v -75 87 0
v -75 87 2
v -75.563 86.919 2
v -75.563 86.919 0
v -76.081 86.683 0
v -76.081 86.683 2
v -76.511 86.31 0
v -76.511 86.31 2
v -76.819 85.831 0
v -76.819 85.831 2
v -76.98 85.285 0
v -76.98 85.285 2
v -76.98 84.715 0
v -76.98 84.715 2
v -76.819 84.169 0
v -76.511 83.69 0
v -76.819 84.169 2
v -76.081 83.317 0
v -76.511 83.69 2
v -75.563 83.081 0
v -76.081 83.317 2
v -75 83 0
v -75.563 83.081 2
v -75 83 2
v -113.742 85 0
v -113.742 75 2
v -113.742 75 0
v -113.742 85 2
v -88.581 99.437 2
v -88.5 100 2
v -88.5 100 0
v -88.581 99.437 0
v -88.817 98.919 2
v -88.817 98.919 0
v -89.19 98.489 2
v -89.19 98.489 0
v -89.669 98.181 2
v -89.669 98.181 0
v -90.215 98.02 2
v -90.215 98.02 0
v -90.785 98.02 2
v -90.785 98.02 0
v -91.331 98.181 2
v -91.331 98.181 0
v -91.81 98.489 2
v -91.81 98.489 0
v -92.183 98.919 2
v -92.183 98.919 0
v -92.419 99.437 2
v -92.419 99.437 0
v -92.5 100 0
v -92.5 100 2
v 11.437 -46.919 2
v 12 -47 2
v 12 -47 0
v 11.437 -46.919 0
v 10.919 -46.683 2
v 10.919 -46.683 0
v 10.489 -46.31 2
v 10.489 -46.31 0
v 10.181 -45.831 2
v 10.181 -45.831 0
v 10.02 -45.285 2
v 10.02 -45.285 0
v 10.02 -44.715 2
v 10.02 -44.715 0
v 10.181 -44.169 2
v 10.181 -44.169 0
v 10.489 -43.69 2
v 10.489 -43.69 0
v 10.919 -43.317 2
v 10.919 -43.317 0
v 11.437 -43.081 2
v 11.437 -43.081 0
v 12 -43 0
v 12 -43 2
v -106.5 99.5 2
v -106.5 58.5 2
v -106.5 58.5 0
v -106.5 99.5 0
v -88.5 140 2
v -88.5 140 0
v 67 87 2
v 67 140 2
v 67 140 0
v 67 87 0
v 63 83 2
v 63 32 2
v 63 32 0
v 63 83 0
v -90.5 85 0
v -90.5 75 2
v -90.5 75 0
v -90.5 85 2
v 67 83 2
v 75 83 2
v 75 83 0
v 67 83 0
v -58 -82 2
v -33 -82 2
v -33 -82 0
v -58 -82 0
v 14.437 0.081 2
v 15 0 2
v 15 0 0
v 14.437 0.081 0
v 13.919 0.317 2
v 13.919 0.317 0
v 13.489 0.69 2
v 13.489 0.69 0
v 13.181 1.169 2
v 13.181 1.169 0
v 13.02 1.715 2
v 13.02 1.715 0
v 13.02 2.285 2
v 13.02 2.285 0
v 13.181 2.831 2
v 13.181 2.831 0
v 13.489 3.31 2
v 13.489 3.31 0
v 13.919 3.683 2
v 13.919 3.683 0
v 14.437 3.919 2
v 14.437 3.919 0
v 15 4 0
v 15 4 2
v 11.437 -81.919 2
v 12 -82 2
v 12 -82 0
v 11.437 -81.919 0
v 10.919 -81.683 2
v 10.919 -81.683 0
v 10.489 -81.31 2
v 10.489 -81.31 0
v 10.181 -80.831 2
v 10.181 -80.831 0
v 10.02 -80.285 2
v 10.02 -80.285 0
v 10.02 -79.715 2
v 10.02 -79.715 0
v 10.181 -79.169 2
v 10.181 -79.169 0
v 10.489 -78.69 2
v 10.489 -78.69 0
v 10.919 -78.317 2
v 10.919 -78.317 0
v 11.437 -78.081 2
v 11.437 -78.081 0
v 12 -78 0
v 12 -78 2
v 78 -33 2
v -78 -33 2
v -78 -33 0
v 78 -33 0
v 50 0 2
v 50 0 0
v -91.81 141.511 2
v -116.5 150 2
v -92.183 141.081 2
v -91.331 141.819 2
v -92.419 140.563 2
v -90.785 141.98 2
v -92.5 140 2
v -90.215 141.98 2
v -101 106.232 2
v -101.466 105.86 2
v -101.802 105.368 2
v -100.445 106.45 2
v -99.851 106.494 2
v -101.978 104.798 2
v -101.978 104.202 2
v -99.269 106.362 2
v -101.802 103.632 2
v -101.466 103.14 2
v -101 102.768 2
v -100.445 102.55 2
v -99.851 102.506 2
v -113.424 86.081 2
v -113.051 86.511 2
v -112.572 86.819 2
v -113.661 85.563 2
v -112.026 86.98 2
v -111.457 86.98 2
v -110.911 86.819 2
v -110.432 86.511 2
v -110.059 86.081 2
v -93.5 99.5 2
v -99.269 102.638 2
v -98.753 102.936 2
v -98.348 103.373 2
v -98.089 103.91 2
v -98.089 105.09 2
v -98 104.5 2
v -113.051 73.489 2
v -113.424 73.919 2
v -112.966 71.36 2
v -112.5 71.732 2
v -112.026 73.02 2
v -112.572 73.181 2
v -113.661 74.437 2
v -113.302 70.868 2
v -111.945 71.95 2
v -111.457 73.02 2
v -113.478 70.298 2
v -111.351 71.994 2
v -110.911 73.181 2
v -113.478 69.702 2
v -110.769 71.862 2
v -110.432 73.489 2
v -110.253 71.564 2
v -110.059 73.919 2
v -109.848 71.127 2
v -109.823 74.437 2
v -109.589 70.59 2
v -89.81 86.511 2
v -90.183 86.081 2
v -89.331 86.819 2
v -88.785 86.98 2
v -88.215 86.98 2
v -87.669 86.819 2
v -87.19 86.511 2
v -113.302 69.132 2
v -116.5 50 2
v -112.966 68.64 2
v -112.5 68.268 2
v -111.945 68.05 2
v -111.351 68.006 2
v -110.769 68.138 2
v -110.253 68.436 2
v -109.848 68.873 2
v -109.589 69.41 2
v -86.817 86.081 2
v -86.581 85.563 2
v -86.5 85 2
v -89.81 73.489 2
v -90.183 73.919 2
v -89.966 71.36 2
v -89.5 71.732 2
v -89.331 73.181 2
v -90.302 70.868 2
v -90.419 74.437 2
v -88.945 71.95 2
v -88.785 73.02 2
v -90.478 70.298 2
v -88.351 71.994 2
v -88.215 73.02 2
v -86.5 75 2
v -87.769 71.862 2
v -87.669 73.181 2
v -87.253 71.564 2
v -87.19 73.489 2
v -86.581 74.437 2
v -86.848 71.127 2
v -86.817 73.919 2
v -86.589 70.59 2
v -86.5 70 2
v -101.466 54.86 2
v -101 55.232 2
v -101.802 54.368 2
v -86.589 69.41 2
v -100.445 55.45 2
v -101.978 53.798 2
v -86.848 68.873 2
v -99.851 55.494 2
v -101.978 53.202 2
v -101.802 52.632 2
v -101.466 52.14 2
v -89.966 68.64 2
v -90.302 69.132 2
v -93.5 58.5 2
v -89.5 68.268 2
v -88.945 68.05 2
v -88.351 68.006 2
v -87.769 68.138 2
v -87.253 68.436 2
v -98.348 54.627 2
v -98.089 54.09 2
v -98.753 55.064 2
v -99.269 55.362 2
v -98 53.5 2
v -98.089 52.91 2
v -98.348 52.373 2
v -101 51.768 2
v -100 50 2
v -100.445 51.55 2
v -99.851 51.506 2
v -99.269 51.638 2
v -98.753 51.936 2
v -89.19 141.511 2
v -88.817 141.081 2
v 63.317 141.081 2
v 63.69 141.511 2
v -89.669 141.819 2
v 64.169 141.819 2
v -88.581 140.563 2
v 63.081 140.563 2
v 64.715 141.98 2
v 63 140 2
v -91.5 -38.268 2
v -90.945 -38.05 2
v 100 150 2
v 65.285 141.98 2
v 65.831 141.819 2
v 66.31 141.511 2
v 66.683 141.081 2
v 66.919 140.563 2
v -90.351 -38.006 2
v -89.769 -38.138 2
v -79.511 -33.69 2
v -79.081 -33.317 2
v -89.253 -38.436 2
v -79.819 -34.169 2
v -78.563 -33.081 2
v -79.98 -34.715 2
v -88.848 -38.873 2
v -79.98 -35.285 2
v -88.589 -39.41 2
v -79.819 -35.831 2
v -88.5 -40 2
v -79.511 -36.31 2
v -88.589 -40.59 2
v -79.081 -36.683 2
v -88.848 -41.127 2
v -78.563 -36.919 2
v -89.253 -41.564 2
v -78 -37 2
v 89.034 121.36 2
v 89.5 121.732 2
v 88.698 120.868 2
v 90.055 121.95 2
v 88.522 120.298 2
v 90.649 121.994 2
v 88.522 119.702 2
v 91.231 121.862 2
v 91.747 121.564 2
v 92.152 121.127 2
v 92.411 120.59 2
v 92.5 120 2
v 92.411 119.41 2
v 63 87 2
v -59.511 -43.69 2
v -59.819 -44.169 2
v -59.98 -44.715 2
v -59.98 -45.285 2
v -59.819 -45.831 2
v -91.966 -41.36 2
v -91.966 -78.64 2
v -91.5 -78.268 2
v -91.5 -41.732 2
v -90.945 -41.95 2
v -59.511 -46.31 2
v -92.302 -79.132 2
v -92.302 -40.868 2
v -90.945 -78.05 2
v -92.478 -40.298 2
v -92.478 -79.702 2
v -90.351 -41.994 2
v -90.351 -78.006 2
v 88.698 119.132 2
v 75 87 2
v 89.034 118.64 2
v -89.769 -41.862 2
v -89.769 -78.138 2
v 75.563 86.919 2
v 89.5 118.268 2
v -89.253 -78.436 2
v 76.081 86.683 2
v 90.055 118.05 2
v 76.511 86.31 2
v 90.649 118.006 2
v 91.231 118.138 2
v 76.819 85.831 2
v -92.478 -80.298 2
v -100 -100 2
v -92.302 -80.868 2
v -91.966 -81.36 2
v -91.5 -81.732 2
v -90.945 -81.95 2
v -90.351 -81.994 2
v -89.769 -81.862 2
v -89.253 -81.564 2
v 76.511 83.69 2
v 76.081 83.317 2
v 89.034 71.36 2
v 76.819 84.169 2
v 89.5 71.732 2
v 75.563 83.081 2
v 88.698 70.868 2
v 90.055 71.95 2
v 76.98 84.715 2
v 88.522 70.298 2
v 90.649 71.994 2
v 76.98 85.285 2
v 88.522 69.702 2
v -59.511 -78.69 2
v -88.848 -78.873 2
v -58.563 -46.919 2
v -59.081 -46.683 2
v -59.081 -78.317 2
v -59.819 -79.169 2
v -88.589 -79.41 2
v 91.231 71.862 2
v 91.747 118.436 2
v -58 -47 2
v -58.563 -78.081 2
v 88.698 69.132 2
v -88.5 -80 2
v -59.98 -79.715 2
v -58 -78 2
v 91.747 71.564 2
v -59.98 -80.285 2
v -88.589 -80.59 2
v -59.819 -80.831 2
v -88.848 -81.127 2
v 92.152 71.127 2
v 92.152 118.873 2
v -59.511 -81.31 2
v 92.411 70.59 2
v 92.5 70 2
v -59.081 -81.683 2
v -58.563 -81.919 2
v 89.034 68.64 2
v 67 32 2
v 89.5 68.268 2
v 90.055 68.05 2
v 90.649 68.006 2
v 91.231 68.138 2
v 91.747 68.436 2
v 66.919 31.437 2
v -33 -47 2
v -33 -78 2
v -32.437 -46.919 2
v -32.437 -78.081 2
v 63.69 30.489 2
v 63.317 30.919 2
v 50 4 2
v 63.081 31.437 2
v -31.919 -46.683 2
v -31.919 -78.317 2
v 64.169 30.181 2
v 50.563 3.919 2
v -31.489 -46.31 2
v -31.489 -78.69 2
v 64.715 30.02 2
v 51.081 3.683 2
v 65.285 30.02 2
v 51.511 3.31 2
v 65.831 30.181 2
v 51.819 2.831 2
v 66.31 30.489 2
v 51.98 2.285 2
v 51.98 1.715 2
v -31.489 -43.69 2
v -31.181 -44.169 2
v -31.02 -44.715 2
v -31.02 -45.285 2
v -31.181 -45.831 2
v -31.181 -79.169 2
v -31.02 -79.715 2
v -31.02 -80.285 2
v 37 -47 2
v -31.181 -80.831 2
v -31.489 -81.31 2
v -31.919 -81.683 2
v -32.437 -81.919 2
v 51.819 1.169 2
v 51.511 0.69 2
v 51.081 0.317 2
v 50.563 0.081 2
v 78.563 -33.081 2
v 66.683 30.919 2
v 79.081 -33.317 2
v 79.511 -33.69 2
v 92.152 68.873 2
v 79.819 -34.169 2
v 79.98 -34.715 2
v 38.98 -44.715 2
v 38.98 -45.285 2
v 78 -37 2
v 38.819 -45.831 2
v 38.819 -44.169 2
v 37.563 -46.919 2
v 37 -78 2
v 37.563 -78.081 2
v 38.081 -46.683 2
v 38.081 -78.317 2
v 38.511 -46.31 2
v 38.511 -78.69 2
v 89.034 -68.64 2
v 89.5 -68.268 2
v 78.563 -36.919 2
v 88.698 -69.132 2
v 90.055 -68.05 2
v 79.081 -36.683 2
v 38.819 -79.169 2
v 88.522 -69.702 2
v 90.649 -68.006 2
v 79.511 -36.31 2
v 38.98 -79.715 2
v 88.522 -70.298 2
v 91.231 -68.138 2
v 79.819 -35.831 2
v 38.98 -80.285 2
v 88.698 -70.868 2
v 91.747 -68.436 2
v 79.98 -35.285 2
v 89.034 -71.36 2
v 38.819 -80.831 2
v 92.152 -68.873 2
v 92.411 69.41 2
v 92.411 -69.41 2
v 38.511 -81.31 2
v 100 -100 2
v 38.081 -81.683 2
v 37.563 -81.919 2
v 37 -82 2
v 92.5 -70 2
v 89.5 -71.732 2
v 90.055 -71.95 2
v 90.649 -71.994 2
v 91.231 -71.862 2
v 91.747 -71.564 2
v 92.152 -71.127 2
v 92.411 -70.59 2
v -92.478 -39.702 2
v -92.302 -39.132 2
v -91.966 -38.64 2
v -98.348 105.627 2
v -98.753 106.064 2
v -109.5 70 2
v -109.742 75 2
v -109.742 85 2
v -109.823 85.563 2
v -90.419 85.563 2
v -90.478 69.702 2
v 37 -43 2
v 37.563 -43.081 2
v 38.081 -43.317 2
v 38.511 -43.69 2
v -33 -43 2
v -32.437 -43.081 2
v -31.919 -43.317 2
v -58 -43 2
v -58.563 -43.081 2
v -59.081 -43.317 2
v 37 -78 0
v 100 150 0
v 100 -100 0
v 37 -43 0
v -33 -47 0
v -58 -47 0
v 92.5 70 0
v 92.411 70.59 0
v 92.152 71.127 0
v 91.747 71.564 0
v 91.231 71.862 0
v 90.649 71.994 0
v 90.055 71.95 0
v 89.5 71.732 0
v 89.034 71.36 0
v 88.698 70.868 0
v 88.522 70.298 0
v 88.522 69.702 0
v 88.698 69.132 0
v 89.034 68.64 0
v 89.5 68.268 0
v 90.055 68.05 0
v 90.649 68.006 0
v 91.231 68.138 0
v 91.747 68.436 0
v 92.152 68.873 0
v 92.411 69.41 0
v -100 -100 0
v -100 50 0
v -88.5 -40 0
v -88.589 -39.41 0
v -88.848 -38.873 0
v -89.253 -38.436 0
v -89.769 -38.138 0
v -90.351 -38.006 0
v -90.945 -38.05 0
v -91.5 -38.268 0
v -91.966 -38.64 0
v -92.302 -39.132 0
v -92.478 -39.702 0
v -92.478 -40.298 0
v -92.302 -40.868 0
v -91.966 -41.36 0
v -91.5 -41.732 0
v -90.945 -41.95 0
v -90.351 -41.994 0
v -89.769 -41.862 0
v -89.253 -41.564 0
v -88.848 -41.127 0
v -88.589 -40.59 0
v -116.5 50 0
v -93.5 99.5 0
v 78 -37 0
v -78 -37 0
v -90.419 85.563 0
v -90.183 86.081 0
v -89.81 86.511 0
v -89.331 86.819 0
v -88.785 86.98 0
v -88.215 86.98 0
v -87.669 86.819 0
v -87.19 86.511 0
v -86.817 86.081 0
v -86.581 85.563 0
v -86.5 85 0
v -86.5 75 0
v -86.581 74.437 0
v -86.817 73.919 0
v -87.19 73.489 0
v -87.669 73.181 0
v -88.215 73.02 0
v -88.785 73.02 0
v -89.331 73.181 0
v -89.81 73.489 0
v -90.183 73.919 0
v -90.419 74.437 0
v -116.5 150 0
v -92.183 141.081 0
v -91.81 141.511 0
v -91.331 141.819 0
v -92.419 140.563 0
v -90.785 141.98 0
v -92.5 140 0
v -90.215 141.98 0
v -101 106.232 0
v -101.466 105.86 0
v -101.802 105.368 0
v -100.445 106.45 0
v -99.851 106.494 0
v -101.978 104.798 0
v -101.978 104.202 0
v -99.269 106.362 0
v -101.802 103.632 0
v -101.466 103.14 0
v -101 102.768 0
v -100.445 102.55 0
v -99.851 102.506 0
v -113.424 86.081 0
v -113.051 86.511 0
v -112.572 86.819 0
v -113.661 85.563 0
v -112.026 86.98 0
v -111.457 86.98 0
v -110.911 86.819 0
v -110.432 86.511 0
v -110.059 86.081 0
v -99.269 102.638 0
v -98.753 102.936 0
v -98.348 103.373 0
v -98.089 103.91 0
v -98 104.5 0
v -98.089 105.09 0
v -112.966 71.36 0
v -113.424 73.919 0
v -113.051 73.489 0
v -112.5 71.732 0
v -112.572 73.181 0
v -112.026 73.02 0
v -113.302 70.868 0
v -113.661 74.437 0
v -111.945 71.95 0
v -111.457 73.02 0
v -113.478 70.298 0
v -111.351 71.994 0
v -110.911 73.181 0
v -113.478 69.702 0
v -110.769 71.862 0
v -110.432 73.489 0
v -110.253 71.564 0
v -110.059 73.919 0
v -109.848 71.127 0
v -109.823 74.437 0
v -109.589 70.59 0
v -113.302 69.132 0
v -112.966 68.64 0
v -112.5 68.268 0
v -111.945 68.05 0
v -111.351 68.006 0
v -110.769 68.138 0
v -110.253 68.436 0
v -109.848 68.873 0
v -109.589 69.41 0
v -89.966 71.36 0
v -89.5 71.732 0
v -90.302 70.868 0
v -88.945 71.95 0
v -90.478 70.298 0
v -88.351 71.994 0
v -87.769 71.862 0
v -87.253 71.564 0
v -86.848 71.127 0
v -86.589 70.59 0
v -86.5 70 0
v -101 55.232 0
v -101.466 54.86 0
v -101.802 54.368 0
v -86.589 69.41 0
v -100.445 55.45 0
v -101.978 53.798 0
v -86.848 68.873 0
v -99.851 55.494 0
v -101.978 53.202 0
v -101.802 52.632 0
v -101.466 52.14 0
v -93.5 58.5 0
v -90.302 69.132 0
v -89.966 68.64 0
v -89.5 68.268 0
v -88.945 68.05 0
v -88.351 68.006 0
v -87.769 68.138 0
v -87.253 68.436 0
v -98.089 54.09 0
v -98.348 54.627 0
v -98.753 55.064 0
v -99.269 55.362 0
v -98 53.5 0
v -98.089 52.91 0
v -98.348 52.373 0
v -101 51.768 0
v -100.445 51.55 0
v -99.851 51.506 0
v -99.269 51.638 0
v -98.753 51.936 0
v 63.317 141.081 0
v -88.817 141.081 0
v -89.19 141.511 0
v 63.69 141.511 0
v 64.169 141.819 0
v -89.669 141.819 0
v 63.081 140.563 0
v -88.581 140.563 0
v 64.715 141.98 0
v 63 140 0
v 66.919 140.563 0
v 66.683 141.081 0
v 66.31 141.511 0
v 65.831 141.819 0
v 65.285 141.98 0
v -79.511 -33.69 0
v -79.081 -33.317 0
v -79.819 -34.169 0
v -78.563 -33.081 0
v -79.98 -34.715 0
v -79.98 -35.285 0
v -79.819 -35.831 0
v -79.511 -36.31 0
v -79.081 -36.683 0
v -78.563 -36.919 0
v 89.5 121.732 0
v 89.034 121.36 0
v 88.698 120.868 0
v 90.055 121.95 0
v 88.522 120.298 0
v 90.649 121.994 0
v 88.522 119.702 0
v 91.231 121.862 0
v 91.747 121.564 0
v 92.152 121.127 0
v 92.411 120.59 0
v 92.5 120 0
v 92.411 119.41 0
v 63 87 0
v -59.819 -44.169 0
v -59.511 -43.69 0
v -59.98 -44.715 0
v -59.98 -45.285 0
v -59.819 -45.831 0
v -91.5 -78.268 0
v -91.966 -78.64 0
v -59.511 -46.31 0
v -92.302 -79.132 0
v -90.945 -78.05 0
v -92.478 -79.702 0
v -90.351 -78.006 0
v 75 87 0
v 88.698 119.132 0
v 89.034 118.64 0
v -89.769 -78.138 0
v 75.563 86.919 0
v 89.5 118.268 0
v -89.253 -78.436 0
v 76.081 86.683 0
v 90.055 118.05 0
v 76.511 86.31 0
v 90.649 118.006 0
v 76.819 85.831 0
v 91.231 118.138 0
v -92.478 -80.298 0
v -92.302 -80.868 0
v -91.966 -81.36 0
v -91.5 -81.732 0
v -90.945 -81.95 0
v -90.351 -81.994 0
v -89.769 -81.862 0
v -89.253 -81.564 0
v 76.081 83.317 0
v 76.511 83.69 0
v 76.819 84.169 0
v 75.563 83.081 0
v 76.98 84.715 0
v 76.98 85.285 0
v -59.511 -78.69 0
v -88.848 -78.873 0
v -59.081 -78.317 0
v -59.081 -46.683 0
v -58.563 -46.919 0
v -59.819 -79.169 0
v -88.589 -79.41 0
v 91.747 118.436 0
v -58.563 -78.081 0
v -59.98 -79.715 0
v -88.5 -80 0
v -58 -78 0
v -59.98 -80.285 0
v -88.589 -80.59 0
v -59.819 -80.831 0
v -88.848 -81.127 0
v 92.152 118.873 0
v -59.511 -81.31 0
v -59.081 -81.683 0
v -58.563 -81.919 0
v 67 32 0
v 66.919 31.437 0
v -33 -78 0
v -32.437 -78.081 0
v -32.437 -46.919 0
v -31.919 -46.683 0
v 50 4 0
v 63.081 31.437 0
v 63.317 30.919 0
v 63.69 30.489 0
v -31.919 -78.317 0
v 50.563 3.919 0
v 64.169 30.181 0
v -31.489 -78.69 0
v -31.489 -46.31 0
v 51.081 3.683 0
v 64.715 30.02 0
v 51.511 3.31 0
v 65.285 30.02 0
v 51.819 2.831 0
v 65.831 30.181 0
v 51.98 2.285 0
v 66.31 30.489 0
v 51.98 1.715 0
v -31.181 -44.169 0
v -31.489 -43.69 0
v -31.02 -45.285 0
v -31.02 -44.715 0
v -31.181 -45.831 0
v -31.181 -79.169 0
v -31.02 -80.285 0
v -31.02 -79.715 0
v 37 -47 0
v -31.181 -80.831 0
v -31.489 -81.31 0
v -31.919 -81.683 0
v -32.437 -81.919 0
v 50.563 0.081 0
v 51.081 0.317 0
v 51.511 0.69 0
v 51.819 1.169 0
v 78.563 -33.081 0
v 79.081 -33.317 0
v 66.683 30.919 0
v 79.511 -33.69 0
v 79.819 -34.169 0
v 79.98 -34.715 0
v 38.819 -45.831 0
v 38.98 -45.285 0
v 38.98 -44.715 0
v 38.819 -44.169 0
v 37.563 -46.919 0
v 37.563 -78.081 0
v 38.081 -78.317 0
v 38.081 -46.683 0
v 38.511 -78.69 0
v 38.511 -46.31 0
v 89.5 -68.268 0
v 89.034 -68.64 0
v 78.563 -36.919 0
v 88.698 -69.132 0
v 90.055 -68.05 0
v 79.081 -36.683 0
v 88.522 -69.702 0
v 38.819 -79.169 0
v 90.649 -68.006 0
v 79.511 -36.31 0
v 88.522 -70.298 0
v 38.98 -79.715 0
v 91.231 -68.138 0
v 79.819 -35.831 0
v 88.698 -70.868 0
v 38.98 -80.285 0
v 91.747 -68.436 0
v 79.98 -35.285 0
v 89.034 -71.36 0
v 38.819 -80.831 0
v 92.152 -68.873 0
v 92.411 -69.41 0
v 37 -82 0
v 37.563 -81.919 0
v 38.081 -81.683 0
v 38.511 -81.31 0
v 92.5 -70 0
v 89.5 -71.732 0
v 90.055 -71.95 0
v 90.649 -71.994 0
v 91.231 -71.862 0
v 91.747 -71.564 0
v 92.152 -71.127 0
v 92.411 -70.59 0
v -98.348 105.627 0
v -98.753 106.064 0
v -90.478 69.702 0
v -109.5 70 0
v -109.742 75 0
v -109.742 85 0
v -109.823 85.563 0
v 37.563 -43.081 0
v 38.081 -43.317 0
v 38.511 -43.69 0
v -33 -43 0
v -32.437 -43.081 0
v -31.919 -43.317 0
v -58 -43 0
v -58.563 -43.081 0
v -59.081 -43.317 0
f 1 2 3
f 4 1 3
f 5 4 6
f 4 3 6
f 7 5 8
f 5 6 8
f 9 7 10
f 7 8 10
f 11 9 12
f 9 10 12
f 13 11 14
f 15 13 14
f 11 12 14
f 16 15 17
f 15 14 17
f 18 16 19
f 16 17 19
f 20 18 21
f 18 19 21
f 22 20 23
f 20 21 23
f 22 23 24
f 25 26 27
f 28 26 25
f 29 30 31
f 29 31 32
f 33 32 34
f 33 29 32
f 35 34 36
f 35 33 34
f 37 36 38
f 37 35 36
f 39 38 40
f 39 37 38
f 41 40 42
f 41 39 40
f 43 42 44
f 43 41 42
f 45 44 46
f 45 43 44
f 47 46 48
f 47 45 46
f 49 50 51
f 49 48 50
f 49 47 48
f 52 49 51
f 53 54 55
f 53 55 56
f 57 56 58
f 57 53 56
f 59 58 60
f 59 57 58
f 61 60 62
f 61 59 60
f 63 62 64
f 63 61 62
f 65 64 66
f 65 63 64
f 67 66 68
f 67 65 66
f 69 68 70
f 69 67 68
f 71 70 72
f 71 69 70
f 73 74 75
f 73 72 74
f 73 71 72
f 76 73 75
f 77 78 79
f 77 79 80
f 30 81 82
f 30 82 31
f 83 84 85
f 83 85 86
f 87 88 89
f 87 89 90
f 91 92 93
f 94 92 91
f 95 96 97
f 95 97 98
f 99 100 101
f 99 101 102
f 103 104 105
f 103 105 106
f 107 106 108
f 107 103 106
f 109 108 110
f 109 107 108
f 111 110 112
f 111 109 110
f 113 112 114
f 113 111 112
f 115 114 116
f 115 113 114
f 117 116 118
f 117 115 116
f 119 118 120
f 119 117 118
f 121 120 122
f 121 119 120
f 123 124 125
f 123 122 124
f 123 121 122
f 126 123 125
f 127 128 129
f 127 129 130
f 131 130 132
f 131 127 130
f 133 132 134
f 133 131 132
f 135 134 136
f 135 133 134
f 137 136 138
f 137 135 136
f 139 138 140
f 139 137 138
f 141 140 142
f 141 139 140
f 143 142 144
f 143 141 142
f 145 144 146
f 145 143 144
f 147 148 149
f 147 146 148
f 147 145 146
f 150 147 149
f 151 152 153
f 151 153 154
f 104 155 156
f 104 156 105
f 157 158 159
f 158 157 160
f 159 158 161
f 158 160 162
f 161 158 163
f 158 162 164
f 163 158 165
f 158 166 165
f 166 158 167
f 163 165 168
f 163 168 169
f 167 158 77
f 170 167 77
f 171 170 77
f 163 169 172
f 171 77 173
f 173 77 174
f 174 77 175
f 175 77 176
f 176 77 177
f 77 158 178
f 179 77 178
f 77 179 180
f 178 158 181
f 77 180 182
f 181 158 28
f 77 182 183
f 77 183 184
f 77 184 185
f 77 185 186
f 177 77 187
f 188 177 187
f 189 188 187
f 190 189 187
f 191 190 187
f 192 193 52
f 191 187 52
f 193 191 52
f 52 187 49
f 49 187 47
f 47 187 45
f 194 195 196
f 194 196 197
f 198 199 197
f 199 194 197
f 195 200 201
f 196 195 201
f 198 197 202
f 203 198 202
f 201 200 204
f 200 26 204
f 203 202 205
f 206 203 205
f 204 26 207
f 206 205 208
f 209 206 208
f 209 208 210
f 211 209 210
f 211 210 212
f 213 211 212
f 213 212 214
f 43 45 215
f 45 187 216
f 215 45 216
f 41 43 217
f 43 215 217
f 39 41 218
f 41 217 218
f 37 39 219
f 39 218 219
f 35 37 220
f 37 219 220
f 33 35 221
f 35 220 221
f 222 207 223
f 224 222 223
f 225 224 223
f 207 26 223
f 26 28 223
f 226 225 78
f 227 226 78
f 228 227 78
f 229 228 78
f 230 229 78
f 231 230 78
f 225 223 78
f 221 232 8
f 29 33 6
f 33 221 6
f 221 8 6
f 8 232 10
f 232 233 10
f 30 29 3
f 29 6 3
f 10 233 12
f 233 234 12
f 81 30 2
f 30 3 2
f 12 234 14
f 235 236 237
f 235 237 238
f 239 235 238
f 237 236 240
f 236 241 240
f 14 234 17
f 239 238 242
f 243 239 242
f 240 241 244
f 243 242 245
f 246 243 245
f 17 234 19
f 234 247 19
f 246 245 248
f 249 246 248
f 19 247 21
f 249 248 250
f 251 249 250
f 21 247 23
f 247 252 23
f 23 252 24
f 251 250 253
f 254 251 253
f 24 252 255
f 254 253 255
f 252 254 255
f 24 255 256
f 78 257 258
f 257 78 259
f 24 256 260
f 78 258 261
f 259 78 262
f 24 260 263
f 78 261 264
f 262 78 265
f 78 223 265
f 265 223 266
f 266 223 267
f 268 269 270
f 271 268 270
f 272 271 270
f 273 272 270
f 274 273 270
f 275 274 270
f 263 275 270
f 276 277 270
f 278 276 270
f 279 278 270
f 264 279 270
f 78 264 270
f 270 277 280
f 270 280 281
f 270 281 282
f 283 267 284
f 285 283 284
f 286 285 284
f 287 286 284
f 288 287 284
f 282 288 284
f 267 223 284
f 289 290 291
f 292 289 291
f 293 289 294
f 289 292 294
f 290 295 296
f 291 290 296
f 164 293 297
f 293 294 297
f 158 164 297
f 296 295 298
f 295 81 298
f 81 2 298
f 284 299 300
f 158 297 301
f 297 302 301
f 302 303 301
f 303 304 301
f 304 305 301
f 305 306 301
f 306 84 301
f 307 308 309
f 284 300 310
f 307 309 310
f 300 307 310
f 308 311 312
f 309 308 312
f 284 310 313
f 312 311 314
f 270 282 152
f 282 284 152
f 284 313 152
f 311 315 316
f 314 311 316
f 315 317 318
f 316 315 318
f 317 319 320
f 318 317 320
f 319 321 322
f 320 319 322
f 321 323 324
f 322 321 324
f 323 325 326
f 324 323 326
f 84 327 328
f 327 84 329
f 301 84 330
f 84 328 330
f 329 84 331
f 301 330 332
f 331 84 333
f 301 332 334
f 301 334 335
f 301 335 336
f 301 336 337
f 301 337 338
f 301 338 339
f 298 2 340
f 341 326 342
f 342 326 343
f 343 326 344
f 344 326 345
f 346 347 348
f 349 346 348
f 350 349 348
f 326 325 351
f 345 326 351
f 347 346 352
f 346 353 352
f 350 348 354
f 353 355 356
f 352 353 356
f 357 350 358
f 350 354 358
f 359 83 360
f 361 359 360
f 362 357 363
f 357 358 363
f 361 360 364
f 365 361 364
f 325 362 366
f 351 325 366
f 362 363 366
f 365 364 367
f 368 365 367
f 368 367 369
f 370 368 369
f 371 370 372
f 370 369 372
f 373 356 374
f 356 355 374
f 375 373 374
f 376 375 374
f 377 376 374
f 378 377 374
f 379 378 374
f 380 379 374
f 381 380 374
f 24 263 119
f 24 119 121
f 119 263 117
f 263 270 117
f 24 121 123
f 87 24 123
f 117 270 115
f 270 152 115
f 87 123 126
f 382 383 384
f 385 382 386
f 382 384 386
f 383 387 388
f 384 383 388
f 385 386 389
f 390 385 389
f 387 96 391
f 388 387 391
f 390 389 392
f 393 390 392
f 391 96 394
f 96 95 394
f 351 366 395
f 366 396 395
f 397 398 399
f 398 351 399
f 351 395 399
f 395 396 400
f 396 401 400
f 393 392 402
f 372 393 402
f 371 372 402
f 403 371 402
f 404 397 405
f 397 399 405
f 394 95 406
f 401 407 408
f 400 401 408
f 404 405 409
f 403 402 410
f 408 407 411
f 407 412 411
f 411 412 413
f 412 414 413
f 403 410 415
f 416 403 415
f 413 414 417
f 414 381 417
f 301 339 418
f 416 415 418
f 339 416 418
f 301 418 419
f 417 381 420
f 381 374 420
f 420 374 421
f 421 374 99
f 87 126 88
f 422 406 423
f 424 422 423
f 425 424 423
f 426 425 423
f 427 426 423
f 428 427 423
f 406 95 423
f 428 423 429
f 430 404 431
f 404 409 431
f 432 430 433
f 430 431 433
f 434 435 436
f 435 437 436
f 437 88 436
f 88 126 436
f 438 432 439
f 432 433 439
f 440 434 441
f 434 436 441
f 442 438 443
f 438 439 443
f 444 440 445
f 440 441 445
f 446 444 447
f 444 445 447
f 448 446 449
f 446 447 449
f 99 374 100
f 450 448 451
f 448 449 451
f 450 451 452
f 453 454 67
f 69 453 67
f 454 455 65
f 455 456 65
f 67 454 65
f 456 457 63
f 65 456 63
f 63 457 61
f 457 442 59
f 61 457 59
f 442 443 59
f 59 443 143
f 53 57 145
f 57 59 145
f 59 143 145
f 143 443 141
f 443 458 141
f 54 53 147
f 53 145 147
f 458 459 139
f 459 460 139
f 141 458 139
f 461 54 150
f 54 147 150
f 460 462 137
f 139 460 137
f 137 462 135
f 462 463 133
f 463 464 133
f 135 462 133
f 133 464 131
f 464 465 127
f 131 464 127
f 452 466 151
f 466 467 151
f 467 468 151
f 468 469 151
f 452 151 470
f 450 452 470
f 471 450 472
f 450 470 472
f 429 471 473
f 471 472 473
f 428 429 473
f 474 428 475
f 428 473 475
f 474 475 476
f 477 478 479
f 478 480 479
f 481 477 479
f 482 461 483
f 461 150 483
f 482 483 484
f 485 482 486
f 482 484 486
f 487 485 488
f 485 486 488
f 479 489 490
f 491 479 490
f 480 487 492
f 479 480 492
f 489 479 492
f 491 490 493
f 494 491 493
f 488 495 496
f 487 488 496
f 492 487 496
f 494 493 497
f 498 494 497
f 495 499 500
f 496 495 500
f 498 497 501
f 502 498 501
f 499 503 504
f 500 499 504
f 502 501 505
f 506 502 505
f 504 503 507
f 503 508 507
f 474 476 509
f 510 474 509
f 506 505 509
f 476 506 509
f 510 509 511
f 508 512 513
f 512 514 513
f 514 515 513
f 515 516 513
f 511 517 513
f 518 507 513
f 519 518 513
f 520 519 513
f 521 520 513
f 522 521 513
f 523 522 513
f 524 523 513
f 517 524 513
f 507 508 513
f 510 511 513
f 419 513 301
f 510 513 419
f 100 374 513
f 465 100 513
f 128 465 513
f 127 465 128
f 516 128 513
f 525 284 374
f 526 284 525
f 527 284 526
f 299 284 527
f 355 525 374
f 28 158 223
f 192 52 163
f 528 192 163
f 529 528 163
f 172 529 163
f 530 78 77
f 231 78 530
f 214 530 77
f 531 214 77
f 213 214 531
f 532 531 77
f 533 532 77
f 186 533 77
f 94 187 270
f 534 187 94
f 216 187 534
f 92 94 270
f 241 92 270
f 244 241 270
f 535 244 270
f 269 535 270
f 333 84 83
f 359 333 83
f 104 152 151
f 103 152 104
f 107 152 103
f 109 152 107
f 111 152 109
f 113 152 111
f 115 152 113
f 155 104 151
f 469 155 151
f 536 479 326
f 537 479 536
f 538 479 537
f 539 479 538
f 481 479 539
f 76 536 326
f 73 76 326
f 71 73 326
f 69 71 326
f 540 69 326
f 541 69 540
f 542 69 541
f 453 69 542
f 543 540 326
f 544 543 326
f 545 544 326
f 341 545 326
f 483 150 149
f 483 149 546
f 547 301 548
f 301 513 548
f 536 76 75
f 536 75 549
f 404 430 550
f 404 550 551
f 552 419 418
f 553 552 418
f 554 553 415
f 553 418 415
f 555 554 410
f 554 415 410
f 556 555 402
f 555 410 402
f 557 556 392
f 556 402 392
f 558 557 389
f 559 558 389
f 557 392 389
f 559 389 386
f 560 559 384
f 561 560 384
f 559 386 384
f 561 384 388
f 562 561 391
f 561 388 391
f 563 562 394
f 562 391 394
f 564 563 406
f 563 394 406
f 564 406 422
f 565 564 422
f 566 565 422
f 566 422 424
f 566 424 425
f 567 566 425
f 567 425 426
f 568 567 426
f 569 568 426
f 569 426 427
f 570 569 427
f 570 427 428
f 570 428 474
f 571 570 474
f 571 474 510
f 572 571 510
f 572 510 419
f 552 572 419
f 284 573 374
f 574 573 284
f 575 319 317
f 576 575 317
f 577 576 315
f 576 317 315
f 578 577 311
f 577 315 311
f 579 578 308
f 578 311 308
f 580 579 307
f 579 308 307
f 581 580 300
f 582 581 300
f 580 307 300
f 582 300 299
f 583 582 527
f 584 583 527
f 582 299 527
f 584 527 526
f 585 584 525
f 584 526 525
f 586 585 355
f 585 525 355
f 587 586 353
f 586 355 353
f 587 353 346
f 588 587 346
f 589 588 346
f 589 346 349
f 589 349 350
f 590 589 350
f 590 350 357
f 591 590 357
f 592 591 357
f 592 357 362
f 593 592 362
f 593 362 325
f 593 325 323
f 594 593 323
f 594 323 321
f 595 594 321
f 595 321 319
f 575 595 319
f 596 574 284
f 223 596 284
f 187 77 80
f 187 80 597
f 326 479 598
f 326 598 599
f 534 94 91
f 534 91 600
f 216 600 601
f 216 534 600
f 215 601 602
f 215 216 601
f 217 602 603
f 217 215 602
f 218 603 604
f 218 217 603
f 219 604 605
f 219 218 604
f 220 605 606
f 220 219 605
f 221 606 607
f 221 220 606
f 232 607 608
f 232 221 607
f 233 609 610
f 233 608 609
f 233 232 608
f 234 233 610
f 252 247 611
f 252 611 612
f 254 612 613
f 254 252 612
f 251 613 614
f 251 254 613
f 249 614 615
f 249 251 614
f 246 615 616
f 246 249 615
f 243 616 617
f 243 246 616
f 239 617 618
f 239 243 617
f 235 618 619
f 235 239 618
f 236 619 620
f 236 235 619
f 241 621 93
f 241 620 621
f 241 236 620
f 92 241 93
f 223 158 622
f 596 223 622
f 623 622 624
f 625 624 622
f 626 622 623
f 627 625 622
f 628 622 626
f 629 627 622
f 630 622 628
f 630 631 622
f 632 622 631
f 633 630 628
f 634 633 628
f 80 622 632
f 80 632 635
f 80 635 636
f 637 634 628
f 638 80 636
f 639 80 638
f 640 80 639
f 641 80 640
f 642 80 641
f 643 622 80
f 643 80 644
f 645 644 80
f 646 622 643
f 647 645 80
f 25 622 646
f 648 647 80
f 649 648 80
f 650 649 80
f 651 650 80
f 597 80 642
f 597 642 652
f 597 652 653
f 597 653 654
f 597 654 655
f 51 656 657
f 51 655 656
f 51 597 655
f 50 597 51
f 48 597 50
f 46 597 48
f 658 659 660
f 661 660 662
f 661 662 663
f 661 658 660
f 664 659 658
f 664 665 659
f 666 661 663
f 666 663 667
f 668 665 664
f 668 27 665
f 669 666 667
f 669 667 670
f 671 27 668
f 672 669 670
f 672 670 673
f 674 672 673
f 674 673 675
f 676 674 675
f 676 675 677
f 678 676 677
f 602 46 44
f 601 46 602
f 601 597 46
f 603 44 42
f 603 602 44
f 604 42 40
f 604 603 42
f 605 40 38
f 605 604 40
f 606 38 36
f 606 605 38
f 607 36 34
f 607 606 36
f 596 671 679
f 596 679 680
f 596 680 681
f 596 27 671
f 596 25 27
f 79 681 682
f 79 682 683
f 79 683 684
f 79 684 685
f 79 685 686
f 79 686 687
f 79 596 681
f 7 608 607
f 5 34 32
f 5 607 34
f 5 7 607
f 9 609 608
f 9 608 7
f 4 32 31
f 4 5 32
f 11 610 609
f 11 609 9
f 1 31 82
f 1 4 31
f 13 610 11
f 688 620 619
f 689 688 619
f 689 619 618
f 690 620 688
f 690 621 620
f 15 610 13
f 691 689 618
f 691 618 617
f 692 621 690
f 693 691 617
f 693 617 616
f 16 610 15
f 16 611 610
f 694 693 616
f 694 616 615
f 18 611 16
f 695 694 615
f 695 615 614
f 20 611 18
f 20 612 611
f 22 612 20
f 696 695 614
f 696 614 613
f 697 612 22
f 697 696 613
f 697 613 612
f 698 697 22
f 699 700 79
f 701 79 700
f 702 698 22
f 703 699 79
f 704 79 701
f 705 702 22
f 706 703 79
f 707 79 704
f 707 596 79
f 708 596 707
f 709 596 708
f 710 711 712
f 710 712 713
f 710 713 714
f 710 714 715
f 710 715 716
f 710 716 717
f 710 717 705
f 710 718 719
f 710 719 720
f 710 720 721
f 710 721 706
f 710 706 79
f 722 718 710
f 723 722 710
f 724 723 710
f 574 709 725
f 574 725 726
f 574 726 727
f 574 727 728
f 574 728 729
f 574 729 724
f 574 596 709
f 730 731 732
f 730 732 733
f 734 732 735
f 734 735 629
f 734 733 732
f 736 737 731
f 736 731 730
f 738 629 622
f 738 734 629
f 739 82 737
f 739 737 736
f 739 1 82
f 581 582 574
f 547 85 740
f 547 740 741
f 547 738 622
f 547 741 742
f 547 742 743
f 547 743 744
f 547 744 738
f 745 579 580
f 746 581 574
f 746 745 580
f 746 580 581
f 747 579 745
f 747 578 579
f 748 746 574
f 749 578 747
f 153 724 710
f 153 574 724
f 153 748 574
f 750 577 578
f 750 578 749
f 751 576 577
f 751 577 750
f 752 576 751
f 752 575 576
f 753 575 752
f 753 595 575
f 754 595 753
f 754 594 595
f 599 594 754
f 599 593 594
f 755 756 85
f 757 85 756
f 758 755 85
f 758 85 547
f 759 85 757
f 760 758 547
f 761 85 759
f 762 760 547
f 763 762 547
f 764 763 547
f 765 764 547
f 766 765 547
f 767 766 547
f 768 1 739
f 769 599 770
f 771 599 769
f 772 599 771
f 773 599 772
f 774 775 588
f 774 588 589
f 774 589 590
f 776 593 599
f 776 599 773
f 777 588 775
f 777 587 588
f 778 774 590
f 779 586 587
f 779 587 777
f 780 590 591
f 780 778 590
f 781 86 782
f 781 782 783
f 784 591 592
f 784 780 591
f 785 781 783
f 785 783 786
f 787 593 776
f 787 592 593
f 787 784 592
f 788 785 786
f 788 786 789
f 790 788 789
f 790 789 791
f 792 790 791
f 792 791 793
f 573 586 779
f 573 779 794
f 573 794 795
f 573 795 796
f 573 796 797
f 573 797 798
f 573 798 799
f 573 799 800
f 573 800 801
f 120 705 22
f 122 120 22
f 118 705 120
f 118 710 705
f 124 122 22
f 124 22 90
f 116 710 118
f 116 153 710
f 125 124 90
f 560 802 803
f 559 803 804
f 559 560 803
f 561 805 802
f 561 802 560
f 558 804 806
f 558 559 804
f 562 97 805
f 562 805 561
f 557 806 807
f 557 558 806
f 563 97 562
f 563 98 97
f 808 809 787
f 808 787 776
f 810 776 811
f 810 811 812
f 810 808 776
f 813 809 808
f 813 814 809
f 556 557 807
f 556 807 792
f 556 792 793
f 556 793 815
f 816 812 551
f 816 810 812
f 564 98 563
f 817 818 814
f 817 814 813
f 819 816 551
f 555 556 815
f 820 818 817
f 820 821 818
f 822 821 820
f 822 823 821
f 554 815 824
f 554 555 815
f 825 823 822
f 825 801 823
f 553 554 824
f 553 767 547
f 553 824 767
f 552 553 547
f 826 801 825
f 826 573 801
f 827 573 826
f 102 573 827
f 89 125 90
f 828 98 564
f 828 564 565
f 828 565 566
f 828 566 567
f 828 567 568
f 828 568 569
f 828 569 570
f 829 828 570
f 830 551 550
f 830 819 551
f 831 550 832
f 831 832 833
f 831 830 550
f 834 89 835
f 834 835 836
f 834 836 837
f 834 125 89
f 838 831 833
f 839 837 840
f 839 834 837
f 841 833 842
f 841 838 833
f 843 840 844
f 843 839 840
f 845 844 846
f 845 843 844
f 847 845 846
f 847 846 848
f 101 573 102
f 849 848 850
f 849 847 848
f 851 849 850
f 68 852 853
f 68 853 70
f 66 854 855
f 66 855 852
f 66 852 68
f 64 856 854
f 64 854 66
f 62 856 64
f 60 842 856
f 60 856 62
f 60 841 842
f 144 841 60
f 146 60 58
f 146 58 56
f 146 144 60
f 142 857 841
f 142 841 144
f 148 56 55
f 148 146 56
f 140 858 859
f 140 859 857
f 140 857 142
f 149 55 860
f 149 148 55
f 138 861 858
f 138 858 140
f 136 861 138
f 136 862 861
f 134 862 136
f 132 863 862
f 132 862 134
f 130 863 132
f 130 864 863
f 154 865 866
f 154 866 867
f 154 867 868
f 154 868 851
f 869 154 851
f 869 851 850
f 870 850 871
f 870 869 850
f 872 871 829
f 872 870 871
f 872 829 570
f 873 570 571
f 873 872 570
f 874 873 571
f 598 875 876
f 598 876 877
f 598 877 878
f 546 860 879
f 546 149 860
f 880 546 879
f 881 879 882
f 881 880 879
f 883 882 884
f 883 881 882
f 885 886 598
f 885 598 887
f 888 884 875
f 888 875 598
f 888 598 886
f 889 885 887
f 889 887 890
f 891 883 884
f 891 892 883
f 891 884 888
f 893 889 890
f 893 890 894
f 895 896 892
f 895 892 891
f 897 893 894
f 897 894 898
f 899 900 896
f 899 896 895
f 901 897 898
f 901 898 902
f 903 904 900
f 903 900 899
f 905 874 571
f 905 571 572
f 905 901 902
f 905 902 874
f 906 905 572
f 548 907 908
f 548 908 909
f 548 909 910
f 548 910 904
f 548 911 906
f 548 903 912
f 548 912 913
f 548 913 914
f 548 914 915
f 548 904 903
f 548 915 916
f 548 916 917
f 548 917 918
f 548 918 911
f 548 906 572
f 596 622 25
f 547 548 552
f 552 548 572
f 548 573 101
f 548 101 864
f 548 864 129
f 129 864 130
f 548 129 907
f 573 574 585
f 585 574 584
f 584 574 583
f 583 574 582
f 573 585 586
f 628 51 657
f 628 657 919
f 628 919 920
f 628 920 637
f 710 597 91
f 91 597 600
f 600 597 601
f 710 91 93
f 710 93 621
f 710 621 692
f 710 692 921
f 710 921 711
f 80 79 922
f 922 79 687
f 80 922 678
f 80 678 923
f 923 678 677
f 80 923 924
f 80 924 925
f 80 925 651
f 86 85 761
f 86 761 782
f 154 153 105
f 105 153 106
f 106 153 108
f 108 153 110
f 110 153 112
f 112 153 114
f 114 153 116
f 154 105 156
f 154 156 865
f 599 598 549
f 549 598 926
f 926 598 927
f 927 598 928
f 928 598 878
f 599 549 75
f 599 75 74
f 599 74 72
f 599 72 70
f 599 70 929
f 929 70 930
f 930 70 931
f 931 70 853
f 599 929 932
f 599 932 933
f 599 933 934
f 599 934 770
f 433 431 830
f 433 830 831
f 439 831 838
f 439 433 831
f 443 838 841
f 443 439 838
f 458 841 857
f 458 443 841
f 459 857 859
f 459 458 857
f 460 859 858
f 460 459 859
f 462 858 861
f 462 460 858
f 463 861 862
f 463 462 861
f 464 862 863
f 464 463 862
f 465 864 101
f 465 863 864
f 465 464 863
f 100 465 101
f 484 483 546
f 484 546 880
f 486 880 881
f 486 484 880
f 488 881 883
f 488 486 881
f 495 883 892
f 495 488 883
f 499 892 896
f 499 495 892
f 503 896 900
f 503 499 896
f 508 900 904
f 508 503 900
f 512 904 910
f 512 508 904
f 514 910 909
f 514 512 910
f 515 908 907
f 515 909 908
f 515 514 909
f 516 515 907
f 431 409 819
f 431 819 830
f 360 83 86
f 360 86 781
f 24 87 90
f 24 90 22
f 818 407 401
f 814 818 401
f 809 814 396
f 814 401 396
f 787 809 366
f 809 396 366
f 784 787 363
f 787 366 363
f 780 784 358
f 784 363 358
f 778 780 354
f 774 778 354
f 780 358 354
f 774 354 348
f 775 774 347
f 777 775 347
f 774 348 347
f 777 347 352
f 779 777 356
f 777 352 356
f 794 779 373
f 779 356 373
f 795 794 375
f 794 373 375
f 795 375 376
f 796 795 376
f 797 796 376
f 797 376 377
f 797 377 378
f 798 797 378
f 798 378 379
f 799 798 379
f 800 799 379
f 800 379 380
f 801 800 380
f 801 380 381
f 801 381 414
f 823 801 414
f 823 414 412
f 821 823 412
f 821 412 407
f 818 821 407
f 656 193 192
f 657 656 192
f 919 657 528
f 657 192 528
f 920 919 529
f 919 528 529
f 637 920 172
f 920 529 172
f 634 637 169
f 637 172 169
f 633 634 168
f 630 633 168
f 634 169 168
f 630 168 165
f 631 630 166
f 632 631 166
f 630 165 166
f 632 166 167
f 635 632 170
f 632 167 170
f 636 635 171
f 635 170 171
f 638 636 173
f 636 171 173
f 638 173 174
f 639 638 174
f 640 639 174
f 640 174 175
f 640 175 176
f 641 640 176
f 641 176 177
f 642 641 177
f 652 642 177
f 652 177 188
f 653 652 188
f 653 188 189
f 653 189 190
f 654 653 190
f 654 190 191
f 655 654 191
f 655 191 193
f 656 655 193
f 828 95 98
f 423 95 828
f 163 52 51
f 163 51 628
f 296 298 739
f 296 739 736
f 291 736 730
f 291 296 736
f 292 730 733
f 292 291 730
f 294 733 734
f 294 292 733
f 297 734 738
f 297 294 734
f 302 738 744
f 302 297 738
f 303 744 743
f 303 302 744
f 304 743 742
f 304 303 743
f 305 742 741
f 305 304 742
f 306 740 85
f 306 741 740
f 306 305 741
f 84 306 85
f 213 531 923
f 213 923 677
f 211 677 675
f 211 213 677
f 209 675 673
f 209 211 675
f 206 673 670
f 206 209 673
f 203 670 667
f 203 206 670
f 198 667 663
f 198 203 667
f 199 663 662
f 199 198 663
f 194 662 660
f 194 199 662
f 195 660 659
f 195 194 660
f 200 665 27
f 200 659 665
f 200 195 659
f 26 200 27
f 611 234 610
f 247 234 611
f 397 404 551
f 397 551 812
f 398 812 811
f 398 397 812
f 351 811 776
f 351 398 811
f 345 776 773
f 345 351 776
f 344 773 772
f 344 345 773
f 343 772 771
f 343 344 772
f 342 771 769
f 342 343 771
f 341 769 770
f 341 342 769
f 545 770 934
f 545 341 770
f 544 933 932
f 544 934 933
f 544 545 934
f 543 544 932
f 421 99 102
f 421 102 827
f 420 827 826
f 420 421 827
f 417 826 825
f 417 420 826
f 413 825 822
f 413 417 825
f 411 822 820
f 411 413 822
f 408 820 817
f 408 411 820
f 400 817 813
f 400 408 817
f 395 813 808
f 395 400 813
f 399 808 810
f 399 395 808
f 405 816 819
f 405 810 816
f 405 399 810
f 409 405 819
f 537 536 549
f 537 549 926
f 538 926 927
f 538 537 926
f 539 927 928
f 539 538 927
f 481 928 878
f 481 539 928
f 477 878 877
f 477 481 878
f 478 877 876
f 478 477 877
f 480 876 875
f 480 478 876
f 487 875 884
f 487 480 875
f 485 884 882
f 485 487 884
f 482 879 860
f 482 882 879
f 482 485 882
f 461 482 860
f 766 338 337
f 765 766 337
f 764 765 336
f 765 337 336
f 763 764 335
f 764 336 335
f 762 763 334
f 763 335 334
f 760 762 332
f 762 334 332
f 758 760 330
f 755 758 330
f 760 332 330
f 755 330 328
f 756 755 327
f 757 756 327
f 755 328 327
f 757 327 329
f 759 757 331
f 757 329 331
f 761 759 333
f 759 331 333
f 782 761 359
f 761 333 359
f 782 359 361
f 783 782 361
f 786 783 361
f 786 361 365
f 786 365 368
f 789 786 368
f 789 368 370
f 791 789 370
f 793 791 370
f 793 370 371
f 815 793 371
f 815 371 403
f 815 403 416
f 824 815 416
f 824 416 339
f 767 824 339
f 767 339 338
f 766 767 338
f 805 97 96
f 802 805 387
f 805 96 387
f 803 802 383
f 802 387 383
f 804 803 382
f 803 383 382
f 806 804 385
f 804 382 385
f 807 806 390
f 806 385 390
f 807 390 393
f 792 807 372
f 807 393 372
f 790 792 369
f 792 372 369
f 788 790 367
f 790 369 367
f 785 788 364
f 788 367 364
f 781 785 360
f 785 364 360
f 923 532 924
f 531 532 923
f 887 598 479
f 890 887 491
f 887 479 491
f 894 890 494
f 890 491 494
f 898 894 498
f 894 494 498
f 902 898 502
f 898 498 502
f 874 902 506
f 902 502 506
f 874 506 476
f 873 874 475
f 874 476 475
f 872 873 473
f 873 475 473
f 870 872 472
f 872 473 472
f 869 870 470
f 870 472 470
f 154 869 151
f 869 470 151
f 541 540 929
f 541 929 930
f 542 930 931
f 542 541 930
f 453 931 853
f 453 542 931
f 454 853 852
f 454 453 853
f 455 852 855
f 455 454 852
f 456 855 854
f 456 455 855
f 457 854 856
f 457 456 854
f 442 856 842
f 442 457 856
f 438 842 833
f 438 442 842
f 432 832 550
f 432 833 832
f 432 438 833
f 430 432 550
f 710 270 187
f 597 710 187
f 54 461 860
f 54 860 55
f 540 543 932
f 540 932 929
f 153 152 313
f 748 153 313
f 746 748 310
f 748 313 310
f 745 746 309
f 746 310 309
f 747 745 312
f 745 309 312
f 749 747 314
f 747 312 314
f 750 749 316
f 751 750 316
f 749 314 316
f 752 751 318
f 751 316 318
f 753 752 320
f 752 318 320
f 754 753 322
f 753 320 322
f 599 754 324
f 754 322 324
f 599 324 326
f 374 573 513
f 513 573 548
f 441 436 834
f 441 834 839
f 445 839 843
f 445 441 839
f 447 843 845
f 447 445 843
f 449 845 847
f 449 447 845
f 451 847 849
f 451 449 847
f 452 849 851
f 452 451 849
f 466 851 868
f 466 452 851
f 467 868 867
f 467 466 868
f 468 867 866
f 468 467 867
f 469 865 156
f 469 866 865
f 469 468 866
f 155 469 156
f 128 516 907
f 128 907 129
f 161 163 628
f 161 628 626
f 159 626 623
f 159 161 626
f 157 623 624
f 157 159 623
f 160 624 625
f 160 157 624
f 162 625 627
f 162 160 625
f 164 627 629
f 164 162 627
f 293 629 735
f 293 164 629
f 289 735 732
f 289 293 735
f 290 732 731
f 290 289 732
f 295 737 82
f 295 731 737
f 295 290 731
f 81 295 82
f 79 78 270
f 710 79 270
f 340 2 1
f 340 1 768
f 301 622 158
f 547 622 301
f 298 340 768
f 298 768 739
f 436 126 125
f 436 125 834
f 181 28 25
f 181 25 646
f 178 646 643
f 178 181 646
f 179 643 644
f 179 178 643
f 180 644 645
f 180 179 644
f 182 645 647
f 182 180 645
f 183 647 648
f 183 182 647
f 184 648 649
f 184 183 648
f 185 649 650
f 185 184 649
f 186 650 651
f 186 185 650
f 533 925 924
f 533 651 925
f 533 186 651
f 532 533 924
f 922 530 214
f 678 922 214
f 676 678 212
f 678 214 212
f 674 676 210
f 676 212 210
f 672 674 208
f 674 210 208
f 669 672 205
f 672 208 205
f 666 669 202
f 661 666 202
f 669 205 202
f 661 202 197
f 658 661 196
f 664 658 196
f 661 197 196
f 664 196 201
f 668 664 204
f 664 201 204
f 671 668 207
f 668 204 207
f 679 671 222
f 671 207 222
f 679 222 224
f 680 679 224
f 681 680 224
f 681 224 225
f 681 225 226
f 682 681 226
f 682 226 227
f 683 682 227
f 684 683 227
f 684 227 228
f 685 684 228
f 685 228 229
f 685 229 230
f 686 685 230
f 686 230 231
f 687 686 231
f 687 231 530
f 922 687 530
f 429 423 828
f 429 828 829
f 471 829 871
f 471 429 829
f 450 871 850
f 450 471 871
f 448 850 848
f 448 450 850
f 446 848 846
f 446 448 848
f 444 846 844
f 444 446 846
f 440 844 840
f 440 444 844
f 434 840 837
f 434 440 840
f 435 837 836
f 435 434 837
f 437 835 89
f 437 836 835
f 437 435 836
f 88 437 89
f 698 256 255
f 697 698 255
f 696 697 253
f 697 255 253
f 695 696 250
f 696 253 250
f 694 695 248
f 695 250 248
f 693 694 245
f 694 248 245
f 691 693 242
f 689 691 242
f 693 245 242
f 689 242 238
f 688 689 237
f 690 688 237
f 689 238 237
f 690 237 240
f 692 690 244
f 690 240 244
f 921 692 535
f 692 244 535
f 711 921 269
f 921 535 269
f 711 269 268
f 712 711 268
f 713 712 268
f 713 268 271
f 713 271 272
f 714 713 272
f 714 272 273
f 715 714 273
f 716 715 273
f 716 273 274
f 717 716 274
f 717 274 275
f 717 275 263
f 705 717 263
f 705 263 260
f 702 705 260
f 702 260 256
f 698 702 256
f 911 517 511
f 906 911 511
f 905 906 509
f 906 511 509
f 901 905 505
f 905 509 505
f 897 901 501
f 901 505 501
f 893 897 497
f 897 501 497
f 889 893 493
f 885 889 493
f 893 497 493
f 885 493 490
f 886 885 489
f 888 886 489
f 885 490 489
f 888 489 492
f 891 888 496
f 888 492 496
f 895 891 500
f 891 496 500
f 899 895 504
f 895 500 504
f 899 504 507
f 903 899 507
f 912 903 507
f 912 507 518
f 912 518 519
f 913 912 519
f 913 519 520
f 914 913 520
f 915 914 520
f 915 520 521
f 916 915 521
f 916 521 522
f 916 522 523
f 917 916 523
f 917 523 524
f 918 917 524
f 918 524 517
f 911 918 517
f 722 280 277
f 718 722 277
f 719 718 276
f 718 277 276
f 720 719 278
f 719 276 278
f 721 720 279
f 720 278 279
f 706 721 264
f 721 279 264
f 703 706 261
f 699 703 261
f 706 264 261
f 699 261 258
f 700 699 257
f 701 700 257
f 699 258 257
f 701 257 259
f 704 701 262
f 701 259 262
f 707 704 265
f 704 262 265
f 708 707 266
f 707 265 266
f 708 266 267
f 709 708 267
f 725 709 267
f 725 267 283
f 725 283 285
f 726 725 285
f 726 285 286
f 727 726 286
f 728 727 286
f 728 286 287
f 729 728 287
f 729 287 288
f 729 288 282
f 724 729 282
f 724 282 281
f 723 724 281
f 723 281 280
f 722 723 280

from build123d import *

# Parameters (mm, degrees)
SKETCH1_W           = 200
SKETCH1_H           = 200
BOSS_EXTRUDE1_DEPTH = 2
SKETCH2_R           = 2
CUT_EXTRUDE1_DEPTH  = 13
SKETCH3_R           = 2
CUT_EXTRUDE2_DEPTH  = 142.435497666
SKETCH4_R           = 2
CUT_EXTRUDE3_DEPTH  = 13
SKETCH5_W           = 2
SKETCH5_H           = 50
BOSS_EXTRUDE2_DEPTH = 16.5
SKETCH6_R           = 2
SKETCH6_W           = 13
SKETCH6_H           = 15
CUT_EXTRUDE4_DEPTH  = 154.545595834
SKETCH7_R           = 2
CUT_EXTRUDE5_DEPTH  = 154.545595834
CUT_EXTRUDE6_DEPTH  = 10
SKETCH11_W          = 216.5
SKETCH11_H          = 2
BOSS_EXTRUDE3_DEPTH = 50
CUT_EXTRUDE8_DEPTH  = 10
CUT_EXTRUDE9_DEPTH  = 10
CUT_EXTRUDE10_DEPTH = 10
SKETCH17_R          = 2
CUT_EXTRUDE11_DEPTH = 10
SKETCH18_R          = 2
CUT_EXTRUDE12_DEPTH = 10
CUT_EXTRUDE13_DEPTH = 10
CUT_EXTRUDE14_DEPTH = 10
CUT_EXTRUDE15_DEPTH = 10
SKETCH22_R          = 2
CUT_EXTRUDE16_DEPTH = 10
SKETCH23_W          = 13
SKETCH23_H          = 26
CUT_EXTRUDE17_DEPTH = 10
CUT_EXTRUDE20_DEPTH = 10


with BuildPart() as part:
    # Sketch1 → Boss-Extrude1 (new body)
    with BuildSketch(Plane.XY):
        Rectangle(SKETCH1_W, SKETCH1_H)
    extrude(amount=BOSS_EXTRUDE1_DEPTH)

    # Sketch2 → Cut-Extrude1 (cut)
    with BuildSketch(Plane.XY.offset(2)):
        with Locations((90.5, 70)):
            Circle(SKETCH2_R)
        with Locations((90.5, -70)):
            Circle(SKETCH2_R)
    extrude(amount=-CUT_EXTRUDE1_DEPTH, mode=Mode.SUBTRACT)

    # Sketch3 → Cut-Extrude2 (cut, through all)
    with BuildSketch(Plane.XY.offset(2)):
        with Locations((-90.5, -40)):
            Circle(SKETCH3_R)
        with Locations((-90.5, -80)):
            Circle(SKETCH3_R)
    extrude(amount=-CUT_EXTRUDE2_DEPTH, mode=Mode.SUBTRACT)

    # Sketch4 → Cut-Extrude3 (cut)
    with BuildSketch(Plane.XY.offset(2)):
        with Locations((-50, -45)):
            Circle(SKETCH4_R)
        with Locations((-50, -80)):
            Circle(SKETCH4_R)
        with Locations((26.5, -45)):
            Circle(SKETCH4_R)
        with Locations((26.5, -80)):
            Circle(SKETCH4_R)
    extrude(amount=-CUT_EXTRUDE3_DEPTH, mode=Mode.SUBTRACT)

    # Sketch5 → Boss-Extrude2 (add)
    with BuildSketch(Plane.ZY.offset(100)):
        with Locations((1, 75)):
            Rectangle(SKETCH5_W, SKETCH5_H)
    extrude(amount=BOSS_EXTRUDE2_DEPTH)

    # Sketch6 → Cut-Extrude4 (cut, through all)
    with BuildSketch(Plane.XY.offset(2)):
        with Locations((-111.5, 70)):
            Circle(SKETCH6_R)
        with Locations((-88.5, 70)):
            Circle(SKETCH6_R)
        with Locations((-100, 66)):
            Rectangle(SKETCH6_W, SKETCH6_H)
    extrude(amount=-CUT_EXTRUDE4_DEPTH, mode=Mode.SUBTRACT)

    # Sketch7 → Cut-Extrude5 (cut, through all)
    with BuildSketch(Plane.XY.offset(2)):
        with Locations((75, 85)):
            Circle(SKETCH7_R)
        with Locations((78, -35)):
            Circle(SKETCH7_R)
        with Locations((-78, -35)):
            Circle(SKETCH7_R)
        with Locations((-75, 85)):
            Circle(SKETCH7_R)
    extrude(amount=-CUT_EXTRUDE5_DEPTH, mode=Mode.SUBTRACT)

    # Sketch8 → Cut-Extrude6 (cut)
    with BuildSketch(Plane.XY.offset(2)):
        with BuildLine():
            Line((67, 95), (67, 32))
            ThreePointArc((67, 32), (65, 30), (63, 32))
            Line((63, 32), (63, 95))
            ThreePointArc((63, 95), (65, 97), (67, 95))
        make_face()
    extrude(amount=-CUT_EXTRUDE6_DEPTH, mode=Mode.SUBTRACT)

    # Sketch11 → Boss-Extrude3 (add)
    with BuildSketch(Plane(origin=(0, 100, 0), x_dir=(1, 0, 0), z_dir=(0, 1, 0))):
        with Locations((-8.25, -1)):
            Rectangle(SKETCH11_W, SKETCH11_H)
    extrude(amount=BOSS_EXTRUDE3_DEPTH)

    # Sketch12 → Cut-Extrude8 (cut)
    with BuildSketch(Plane.XY.offset(2)):
        with BuildLine():
            Line((63, 90.479574642), (63, 140))
            ThreePointArc((63, 140), (65, 142), (67, 140))
            Line((67, 140), (67, 90.479574642))
            ThreePointArc((67, 90.479574642), (65, 88.479574642), (63, 90.479574642))
        make_face()
    extrude(amount=-CUT_EXTRUDE8_DEPTH, mode=Mode.SUBTRACT)

    # Sketch15 → Cut-Extrude9 (cut)
    with BuildSketch(Plane.XY.offset(2)):
        with BuildLine():
            Line((-78, -33), (78, -33))
            ThreePointArc((78, -33), (80, -35), (78, -37))
            Line((78, -37), (-78, -37))
            ThreePointArc((-78, -37), (-80, -35), (-78, -33))
        make_face()
    extrude(amount=-CUT_EXTRUDE9_DEPTH, mode=Mode.SUBTRACT)

    # Sketch16 → Cut-Extrude10 (cut)
    with BuildSketch(Plane.XY.offset(2)):
        with BuildLine():
            Line((-75, 87), (75, 87))
            ThreePointArc((75, 87), (77, 85), (75, 83))
            Line((75, 83), (-75, 83))
            ThreePointArc((-75, 83), (-77, 85), (-75, 87))
        make_face()
    extrude(amount=-CUT_EXTRUDE10_DEPTH, mode=Mode.SUBTRACT)

    # Sketch17 → Cut-Extrude11 (cut)
    with BuildSketch(Plane.XY.offset(2)):
        with Locations((90.5, 120)):
            Circle(SKETCH17_R)
    extrude(amount=-CUT_EXTRUDE11_DEPTH, mode=Mode.SUBTRACT)

    # Sketch18 → Cut-Extrude12 (cut)
    with BuildSketch(Plane.XY.offset(2)):
        with Locations((-90.5, 120)):
            Circle(SKETCH18_R)
    extrude(amount=-CUT_EXTRUDE12_DEPTH, mode=Mode.SUBTRACT)

    # Sketch19 → Cut-Extrude13 (cut)
    with BuildSketch(Plane.XY.offset(2)):
        with BuildLine():
            Line((15, 4), (50, 4))
            ThreePointArc((50, 4), (52, 2), (50, 0))
            Line((50, 0), (15, 0))
            ThreePointArc((15, 0), (13, 2), (15, 4))
        make_face()
    extrude(amount=-CUT_EXTRUDE13_DEPTH, mode=Mode.SUBTRACT)

    # Sketch20 → Cut-Extrude14 (cut)
    with BuildSketch(Plane.XY.offset(2)):
        with BuildLine():
            Line((-58, -43), (-33, -43))
            ThreePointArc((-33, -43), (-31, -45), (-33, -47))
            Line((-33, -47), (-58, -47))
            ThreePointArc((-58, -47), (-60, -45), (-58, -43))
        make_face()
        with BuildLine():
            Line((-58, -78), (-33, -78))
            ThreePointArc((-33, -78), (-31, -80), (-33, -82))
            Line((-33, -82), (-58, -82))
            ThreePointArc((-58, -82), (-60, -80), (-58, -78))
        make_face()
        with BuildLine():
            Line((12, -43), (37, -43))
            ThreePointArc((37, -43), (39, -45), (37, -47))
            Line((37, -47), (12, -47))
            ThreePointArc((12, -47), (10, -45), (12, -43))
        make_face()
        with BuildLine():
            Line((12, -78), (37, -78))
            ThreePointArc((37, -78), (39, -80), (37, -82))
            Line((37, -82), (12, -82))
            ThreePointArc((12, -82), (10, -80), (12, -78))
        make_face()
    extrude(amount=-CUT_EXTRUDE14_DEPTH, mode=Mode.SUBTRACT)

    # Sketch21 → Cut-Extrude15 (cut)
    with BuildSketch(Plane.XY.offset(2)):
        with BuildLine():
            Line((-88.5, 140), (-88.5, 100))
            ThreePointArc((-88.5, 100), (-90.5, 98), (-92.5, 100))
            Line((-92.5, 100), (-92.5, 140))
            ThreePointArc((-92.5, 140), (-90.5, 142), (-88.5, 140))
        make_face()
    extrude(amount=-CUT_EXTRUDE15_DEPTH, mode=Mode.SUBTRACT)

    # Sketch22 → Cut-Extrude16 (cut)
    with BuildSketch(Plane.XY.offset(2)):
        with Locations((-100, 53.5)):
            Circle(SKETCH22_R)
        with Locations((-100, 104.5)):
            Circle(SKETCH22_R)
    extrude(amount=-CUT_EXTRUDE16_DEPTH, mode=Mode.SUBTRACT)

    # Sketch23 → Cut-Extrude17 (cut)
    with BuildSketch(Plane.XY.offset(2)):
        with Locations((-100, 86.5)):
            Rectangle(SKETCH23_W, SKETCH23_H)
    extrude(amount=-CUT_EXTRUDE17_DEPTH, mode=Mode.SUBTRACT)

    # Sketch24 → Cut-Extrude20 (cut)
    with BuildSketch(Plane.XY.offset(2)):
        with BuildLine():
            Line((-90.5, 75), (-90.5, 85))
            ThreePointArc((-90.5, 85), (-88.5, 87), (-86.5, 85))
            Line((-86.5, 85), (-86.5, 75))
            ThreePointArc((-86.5, 75), (-88.5, 73), (-90.5, 75))
        make_face()
        with BuildLine():
            Line((-113.741584086, 75), (-113.741584086, 85))
            ThreePointArc((-113.741584086, 85), (-111.741584086, 87), (-109.741584086, 85))
            Line((-109.741584086, 85), (-109.741584086, 75))
            ThreePointArc((-109.741584086, 75), (-111.741584086, 73), (-113.741584086, 75))
        make_face()
    extrude(amount=-CUT_EXTRUDE20_DEPTH, mode=Mode.SUBTRACT)


solid = part.part
